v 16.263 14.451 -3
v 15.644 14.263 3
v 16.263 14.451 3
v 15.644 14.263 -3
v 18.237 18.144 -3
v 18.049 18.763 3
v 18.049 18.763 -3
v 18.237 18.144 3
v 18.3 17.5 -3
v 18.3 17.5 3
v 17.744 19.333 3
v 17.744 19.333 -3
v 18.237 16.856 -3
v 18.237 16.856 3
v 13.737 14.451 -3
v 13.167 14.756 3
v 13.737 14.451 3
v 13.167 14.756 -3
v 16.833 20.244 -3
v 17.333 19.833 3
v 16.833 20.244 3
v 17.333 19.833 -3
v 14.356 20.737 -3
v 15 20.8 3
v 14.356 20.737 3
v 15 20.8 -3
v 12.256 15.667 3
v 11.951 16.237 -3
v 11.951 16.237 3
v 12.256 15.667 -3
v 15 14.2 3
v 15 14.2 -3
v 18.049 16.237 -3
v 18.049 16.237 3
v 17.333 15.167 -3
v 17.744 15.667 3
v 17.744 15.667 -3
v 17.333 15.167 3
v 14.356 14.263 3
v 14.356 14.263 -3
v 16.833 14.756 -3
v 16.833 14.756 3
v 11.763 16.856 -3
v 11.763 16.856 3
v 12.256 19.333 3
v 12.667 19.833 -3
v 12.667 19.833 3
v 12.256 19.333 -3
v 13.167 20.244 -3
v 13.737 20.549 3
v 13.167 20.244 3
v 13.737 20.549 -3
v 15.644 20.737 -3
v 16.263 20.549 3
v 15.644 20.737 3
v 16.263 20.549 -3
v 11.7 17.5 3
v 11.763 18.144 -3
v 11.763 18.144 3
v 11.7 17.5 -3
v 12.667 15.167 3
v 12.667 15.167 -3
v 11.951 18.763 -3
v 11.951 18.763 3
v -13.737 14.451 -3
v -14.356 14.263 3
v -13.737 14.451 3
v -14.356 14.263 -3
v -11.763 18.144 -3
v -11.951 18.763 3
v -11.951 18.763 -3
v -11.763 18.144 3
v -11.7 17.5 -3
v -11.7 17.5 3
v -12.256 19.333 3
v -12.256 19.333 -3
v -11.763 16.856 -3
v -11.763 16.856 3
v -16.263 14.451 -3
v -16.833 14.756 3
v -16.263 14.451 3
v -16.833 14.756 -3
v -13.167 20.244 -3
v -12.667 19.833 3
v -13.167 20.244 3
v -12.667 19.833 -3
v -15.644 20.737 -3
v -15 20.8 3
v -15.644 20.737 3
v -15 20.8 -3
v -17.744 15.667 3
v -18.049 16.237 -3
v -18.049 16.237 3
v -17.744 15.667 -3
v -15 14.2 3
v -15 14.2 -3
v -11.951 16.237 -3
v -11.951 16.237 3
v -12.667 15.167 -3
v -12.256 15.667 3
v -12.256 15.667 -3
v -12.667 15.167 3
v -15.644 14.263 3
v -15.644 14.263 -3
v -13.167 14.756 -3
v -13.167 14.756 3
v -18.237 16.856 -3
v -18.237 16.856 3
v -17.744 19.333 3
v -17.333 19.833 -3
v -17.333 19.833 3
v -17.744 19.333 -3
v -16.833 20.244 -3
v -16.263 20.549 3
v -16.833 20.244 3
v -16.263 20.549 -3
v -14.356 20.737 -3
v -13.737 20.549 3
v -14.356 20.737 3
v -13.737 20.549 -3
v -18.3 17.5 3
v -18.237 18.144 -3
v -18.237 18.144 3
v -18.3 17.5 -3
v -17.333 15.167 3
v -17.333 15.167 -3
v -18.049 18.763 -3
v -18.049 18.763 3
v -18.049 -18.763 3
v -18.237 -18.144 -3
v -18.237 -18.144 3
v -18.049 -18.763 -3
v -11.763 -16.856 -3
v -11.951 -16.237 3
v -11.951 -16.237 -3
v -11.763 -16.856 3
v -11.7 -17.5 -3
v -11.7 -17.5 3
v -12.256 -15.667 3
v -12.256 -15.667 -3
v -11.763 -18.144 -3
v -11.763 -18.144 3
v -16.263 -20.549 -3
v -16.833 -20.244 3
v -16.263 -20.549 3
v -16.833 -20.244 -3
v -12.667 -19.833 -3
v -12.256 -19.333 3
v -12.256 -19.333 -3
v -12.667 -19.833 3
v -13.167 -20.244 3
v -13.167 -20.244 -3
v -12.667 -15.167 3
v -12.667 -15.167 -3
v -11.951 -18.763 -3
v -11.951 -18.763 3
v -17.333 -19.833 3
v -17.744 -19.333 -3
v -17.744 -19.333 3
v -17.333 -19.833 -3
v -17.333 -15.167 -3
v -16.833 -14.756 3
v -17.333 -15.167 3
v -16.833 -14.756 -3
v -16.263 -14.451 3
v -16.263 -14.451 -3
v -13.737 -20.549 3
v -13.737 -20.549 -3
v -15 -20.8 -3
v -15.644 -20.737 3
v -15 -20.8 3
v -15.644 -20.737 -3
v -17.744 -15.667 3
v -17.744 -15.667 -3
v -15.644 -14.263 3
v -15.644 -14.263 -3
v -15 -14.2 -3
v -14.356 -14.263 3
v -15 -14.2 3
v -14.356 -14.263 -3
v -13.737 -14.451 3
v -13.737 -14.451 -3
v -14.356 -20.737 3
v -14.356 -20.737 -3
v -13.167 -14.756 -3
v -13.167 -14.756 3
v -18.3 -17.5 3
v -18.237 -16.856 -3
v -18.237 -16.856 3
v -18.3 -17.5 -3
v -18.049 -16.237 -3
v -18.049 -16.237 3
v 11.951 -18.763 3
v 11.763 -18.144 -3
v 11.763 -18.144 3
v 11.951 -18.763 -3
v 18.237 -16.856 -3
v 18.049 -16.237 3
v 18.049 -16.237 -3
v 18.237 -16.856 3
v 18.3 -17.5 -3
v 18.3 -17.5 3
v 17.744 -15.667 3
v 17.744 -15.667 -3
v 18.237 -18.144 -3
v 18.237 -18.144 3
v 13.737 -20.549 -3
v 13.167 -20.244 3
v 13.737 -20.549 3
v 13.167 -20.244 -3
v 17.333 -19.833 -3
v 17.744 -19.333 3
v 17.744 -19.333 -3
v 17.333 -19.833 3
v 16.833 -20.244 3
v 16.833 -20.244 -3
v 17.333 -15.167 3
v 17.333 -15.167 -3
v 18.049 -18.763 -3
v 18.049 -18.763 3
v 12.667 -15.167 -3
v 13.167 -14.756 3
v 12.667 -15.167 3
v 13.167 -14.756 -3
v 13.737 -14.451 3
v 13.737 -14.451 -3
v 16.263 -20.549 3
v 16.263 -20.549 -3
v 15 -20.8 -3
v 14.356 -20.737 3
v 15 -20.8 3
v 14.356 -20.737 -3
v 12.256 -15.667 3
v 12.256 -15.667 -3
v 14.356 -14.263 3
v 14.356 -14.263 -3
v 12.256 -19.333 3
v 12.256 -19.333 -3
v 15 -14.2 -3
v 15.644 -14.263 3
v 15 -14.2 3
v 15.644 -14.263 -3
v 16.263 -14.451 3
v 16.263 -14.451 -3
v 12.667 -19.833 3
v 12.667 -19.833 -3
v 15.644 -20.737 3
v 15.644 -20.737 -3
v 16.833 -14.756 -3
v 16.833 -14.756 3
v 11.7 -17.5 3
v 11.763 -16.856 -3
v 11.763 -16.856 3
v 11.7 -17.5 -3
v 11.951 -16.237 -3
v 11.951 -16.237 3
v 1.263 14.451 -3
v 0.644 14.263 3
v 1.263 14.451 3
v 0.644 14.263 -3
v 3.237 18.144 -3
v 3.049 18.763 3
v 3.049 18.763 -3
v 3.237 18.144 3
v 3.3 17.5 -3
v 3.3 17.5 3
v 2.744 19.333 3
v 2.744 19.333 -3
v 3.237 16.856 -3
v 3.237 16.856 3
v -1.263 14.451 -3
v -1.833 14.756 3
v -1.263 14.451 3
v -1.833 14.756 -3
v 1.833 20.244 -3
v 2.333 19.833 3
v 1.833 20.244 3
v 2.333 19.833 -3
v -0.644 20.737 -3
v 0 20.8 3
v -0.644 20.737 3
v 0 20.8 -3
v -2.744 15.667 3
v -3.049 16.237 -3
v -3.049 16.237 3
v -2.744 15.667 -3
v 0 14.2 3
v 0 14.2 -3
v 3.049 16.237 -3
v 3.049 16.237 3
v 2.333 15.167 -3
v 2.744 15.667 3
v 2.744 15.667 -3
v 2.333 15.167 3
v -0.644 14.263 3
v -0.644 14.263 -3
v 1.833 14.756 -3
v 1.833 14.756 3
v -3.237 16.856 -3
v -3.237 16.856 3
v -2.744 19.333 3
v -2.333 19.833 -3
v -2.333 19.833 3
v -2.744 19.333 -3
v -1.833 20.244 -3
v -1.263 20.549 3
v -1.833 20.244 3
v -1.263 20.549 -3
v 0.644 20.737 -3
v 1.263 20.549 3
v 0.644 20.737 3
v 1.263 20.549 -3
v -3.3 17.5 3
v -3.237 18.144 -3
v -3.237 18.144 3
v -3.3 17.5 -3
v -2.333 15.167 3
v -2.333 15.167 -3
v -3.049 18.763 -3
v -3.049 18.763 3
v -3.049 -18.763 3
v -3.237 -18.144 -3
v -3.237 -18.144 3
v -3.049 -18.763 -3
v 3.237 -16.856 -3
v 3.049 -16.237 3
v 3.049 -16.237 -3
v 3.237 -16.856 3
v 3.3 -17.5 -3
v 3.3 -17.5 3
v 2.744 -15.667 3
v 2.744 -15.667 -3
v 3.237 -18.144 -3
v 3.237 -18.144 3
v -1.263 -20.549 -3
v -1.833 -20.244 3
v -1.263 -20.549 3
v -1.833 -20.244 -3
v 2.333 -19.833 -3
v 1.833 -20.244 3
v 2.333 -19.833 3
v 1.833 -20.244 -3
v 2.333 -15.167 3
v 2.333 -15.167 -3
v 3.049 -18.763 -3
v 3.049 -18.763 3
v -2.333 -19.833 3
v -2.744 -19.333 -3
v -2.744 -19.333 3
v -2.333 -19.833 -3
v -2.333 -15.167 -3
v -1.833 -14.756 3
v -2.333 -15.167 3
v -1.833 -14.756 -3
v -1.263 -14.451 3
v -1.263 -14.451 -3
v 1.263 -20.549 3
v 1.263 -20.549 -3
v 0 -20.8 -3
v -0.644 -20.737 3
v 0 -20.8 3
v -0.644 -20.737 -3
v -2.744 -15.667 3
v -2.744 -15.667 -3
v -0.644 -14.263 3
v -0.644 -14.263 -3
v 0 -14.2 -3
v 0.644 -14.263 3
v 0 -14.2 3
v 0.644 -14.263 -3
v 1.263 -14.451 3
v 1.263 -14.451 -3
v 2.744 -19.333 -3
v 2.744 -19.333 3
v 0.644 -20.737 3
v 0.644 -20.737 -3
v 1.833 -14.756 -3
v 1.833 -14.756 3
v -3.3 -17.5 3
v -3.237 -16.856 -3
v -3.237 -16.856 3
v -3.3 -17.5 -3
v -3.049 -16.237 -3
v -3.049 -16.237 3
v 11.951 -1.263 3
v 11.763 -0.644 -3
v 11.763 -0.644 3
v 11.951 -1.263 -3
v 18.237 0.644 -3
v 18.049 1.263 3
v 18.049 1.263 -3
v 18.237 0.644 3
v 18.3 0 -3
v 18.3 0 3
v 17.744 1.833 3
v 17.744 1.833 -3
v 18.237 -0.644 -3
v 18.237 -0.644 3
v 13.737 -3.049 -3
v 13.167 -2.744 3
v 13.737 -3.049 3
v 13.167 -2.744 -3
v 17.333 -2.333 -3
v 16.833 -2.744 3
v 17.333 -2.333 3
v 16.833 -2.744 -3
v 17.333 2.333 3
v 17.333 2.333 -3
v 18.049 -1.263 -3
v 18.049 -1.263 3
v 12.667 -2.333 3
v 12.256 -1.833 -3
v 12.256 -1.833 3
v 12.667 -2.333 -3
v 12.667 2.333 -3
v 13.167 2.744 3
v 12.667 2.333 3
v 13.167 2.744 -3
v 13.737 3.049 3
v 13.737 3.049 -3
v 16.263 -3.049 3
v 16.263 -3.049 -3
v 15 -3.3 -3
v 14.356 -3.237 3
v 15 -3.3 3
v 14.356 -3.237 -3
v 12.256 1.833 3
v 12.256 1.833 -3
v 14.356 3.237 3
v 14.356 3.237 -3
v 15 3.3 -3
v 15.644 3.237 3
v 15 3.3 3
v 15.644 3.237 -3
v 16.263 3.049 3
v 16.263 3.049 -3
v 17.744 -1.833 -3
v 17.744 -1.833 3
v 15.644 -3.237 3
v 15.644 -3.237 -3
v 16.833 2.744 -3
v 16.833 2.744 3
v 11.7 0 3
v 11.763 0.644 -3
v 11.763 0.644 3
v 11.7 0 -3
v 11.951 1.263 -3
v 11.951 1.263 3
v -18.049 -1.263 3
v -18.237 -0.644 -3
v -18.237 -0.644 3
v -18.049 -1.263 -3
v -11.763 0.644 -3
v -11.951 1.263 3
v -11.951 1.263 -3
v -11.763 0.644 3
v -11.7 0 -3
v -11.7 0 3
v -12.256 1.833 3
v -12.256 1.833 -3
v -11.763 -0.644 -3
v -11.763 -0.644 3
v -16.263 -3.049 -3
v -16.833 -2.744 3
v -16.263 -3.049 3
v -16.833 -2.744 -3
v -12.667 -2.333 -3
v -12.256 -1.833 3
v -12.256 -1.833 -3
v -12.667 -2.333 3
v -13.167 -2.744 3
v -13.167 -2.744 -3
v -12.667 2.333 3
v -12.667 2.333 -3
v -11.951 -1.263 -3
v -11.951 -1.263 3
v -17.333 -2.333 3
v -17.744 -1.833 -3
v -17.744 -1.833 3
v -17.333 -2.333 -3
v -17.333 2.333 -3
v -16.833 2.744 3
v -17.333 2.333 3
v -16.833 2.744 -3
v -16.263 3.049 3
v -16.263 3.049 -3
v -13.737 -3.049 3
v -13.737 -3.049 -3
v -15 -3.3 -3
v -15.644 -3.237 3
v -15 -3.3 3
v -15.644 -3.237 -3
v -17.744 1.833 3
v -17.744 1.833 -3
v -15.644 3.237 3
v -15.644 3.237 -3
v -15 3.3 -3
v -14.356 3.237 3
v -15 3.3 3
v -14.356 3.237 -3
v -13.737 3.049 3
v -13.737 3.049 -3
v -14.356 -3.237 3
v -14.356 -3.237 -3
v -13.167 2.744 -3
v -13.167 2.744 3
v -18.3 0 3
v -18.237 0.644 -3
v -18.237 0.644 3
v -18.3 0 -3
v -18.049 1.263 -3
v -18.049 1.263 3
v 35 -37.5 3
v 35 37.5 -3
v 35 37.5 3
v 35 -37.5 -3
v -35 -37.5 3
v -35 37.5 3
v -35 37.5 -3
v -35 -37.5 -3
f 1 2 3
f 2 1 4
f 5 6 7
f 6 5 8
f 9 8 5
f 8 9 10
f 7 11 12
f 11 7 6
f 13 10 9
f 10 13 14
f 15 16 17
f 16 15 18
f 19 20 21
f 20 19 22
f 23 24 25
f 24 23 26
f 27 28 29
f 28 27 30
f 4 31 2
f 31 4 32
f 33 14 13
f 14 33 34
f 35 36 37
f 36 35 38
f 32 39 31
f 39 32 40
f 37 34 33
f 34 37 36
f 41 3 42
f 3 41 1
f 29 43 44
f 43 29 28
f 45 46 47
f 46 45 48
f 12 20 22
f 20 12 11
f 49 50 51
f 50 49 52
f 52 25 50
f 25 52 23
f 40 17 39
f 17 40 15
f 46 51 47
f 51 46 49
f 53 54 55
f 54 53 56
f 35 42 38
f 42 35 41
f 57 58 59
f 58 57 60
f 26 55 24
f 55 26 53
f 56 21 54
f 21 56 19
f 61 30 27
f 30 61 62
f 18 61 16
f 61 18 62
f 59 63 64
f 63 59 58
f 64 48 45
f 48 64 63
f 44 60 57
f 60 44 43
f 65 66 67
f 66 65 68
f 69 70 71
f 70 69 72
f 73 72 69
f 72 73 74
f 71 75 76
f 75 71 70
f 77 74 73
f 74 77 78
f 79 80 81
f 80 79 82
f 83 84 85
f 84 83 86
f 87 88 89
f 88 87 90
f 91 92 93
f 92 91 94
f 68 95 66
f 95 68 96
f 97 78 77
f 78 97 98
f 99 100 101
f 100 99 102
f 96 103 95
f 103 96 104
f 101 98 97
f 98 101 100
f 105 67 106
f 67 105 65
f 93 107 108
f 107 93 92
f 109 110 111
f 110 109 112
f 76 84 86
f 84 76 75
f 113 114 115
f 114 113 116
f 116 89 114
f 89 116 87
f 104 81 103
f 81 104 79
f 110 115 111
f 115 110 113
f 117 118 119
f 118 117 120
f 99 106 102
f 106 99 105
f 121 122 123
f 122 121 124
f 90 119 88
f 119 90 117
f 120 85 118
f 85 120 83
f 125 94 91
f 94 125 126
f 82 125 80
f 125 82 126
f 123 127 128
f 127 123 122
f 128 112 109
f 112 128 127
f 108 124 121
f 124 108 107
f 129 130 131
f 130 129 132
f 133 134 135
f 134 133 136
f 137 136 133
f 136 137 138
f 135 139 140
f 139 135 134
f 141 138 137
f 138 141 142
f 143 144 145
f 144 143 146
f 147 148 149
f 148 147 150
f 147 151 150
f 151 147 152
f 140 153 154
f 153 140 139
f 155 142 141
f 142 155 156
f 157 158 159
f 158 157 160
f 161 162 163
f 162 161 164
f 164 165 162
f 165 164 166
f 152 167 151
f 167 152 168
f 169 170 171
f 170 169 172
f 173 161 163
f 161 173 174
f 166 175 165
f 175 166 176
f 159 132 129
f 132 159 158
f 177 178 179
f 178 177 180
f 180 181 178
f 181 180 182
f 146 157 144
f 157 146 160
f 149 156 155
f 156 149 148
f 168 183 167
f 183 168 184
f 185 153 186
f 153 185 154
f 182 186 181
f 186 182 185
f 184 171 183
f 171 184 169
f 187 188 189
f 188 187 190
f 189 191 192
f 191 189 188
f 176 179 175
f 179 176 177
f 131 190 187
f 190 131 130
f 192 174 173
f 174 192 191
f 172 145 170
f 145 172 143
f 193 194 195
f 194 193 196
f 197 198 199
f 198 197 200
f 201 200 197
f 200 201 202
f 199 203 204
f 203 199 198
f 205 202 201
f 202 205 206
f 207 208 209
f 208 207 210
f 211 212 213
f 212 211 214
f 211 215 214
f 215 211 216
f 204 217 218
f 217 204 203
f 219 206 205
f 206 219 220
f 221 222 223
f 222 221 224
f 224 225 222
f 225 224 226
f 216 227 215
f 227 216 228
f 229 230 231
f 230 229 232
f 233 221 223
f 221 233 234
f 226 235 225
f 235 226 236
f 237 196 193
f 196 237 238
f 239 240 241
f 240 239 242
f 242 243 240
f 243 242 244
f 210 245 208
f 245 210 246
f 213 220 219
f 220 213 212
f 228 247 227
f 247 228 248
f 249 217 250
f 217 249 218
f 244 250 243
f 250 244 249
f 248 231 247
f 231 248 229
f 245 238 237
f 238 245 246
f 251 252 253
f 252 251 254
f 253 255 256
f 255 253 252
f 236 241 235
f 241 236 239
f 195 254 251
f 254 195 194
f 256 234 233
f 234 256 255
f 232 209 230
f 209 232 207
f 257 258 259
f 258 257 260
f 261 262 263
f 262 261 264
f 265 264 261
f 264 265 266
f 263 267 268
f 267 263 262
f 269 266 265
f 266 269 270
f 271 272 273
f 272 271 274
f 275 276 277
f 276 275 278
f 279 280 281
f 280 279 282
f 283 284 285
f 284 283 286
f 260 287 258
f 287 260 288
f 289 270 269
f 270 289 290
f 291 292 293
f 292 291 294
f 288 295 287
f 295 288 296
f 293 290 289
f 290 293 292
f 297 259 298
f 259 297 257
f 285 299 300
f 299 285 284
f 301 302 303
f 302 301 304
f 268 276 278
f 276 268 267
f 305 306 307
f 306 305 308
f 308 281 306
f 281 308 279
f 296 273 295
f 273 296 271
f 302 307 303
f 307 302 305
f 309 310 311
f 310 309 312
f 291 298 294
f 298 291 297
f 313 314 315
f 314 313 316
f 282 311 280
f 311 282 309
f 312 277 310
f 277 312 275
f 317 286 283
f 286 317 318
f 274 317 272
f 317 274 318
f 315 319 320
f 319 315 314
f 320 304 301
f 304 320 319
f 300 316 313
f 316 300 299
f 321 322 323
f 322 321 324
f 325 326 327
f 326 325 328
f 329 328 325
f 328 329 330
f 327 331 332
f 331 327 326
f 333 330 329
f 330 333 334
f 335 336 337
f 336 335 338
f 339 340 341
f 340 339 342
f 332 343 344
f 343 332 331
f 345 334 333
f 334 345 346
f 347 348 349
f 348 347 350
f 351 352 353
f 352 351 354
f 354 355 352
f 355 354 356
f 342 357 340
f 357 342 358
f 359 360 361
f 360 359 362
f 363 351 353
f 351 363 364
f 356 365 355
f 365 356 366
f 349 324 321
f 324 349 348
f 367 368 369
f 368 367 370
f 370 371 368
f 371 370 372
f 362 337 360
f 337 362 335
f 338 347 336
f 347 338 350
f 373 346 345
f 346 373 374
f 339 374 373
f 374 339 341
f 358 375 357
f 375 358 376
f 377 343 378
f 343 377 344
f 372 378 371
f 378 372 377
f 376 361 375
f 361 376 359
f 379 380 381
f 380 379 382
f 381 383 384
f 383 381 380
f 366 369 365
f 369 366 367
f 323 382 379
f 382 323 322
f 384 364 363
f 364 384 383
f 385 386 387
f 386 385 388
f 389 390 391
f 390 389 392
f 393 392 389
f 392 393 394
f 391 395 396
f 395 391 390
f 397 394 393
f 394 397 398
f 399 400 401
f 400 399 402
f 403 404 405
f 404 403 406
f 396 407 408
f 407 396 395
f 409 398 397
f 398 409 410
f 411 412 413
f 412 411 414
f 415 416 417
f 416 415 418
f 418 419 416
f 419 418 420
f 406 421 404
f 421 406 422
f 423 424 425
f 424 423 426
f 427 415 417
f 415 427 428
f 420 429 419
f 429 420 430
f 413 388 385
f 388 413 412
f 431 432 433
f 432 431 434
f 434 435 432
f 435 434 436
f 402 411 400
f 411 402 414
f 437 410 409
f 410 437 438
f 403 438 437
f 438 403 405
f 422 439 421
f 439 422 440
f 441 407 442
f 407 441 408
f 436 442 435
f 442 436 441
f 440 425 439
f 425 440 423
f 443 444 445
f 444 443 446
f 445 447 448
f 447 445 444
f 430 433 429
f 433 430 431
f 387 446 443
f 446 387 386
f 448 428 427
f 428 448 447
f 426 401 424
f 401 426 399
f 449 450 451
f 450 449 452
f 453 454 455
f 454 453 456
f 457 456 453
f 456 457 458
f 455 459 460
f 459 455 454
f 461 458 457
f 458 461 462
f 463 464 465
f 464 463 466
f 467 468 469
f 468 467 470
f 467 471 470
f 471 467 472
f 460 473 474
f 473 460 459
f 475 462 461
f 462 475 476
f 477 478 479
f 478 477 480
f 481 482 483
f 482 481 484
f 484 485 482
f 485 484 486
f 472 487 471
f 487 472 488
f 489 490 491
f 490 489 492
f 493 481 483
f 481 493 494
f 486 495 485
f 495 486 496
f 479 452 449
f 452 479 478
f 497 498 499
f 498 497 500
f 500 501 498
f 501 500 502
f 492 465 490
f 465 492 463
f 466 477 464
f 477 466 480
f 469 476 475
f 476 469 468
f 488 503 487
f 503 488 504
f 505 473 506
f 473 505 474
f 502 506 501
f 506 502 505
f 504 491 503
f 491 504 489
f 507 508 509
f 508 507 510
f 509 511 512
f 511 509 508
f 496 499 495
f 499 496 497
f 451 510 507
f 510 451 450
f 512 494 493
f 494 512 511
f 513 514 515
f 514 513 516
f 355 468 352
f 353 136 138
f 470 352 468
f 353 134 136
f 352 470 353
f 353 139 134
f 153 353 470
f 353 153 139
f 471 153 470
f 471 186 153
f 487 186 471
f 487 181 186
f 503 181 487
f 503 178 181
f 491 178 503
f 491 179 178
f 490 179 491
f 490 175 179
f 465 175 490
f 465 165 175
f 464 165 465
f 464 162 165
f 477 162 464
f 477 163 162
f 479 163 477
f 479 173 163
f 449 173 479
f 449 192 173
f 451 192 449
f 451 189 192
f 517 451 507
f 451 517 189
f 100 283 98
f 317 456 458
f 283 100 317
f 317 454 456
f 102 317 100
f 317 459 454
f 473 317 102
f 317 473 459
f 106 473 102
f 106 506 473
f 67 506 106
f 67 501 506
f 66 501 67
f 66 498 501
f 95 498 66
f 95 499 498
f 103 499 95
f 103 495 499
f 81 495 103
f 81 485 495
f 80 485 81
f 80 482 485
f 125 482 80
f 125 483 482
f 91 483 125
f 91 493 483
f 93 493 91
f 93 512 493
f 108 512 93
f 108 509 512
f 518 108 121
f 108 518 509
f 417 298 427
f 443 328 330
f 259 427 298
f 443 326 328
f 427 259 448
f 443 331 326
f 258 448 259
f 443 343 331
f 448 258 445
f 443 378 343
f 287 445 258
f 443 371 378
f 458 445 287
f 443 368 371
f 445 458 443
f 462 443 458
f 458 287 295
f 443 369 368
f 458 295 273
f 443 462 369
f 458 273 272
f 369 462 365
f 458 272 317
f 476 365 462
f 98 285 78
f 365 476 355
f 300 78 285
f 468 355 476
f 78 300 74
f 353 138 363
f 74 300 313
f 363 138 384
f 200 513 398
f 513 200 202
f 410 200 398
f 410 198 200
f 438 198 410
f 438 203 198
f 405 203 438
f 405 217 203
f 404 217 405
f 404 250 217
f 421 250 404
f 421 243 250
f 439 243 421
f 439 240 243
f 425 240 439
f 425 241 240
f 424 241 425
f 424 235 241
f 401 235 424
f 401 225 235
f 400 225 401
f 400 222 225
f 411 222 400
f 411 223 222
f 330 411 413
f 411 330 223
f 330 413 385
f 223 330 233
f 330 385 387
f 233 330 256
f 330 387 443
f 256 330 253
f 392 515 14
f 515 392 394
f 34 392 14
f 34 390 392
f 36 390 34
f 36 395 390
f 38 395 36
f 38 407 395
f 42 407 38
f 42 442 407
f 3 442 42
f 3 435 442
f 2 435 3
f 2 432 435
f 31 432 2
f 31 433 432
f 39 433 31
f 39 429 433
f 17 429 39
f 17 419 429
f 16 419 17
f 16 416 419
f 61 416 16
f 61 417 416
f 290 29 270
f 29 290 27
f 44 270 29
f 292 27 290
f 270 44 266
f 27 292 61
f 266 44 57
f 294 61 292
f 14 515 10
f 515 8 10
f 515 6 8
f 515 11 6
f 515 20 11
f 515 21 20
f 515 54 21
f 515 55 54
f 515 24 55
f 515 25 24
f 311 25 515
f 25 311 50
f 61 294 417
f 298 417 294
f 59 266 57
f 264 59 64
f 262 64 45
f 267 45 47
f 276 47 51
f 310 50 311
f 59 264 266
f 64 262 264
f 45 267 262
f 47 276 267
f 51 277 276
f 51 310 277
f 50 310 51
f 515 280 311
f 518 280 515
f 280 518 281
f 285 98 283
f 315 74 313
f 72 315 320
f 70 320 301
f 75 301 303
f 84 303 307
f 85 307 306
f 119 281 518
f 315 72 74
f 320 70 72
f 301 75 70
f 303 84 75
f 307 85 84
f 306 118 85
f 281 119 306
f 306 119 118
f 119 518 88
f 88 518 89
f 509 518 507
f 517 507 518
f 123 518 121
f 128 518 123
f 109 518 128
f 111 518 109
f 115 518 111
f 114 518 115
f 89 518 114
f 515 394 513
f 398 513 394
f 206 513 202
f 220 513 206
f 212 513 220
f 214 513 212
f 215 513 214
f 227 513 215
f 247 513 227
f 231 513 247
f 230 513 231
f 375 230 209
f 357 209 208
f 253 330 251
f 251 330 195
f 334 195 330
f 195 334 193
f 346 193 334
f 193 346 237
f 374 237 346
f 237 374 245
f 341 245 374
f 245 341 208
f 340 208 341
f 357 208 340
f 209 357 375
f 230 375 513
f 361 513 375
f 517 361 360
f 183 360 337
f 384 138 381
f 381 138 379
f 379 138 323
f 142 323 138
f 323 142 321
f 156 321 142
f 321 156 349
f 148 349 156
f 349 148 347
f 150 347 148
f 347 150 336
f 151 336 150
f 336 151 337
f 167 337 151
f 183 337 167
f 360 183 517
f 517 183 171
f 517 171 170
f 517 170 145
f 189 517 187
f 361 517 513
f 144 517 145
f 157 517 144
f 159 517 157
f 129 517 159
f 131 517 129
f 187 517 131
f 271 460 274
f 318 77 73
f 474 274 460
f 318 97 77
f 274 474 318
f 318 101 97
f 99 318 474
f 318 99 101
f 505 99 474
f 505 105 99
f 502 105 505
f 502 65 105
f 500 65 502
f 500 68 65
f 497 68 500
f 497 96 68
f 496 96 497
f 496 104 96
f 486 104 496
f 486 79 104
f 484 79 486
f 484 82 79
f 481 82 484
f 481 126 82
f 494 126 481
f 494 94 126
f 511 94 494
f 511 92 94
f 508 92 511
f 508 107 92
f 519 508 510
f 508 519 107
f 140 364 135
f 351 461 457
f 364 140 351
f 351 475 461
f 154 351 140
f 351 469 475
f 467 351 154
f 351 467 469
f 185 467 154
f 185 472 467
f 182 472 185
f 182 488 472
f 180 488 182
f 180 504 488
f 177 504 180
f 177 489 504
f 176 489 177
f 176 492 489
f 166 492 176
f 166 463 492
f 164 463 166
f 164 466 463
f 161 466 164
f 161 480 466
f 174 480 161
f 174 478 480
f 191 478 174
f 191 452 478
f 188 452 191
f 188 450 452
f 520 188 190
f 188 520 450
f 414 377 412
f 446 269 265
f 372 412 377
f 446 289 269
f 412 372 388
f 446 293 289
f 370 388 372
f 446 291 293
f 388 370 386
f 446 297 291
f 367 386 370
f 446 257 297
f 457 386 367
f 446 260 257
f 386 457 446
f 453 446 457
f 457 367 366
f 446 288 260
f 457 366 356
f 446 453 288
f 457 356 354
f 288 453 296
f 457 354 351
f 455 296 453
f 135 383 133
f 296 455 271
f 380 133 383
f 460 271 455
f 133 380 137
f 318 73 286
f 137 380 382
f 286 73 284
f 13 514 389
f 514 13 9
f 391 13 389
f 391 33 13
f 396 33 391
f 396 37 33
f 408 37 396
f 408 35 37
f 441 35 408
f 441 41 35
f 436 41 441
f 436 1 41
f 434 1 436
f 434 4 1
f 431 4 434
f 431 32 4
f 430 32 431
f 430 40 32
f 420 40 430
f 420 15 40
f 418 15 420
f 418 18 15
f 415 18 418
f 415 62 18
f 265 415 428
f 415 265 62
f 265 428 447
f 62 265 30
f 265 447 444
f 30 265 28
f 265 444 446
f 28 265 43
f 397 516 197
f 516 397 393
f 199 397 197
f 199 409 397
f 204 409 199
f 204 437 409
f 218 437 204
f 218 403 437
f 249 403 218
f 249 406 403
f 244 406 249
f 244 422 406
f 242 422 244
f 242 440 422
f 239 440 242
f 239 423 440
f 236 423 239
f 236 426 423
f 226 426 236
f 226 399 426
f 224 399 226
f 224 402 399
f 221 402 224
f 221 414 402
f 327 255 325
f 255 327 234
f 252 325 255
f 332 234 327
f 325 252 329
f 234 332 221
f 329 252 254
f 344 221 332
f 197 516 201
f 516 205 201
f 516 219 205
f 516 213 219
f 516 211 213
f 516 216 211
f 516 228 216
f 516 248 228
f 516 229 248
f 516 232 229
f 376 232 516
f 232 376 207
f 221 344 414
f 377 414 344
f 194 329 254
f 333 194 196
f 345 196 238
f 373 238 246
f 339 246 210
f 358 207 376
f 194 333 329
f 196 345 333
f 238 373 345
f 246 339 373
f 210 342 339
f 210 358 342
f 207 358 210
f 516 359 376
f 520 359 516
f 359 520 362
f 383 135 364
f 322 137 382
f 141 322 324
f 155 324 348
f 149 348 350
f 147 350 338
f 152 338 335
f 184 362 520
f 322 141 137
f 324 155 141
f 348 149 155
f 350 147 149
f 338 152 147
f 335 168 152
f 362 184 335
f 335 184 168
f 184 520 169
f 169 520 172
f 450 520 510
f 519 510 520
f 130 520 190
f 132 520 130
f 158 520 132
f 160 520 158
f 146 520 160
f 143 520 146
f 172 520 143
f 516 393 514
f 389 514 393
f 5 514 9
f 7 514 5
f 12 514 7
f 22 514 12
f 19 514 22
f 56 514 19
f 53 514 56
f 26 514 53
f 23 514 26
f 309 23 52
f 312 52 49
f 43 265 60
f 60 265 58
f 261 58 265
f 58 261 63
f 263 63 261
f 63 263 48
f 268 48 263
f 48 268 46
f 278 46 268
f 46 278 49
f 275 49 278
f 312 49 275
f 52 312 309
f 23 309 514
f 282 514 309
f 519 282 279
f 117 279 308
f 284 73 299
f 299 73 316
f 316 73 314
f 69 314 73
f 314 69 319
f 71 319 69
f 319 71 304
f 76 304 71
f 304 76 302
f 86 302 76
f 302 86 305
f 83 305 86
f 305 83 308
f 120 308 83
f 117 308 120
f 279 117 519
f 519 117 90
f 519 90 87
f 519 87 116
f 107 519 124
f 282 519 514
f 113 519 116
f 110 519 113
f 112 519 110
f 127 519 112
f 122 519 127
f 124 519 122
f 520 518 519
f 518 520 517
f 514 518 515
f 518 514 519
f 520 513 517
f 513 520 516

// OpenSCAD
$fn = 32;

// ----------------------------------------------------------------------
// Corner plate 70 x 75 x 6
// 8 holes, centres taken from the edge offset
// ----------------------------------------------------------------------

// --- parameters (mm) ---
plate = [70, 75, 6];  // overall size (x, y, z)
holes = 8;            // number of holes the drawing asks for
hole_d = 6.6;         // hole diameter
edge = 20;            // hole centre offset from the plate edge

// --- derived feature positions (mm) ---
corner_x = plate[0] / 2 - edge;  // = 15   corner hole X
corner_y = plate[1] / 2 - edge;  // = 17.5   corner hole Y
feature_centers = [
  [corner_x, corner_y],
  [-corner_x, corner_y],
  [-corner_x, -corner_y],
  [corner_x, -corner_y],
  [0, corner_y],
  [0, -corner_y],
  [corner_x, 0],
  [-corner_x, 0]
];   // hole centres the loop below drills

// plate outline, every hole drilled through with the same cutters
difference() {
  cube(plate, center = true);
  for (centre = feature_centers)
    translate([centre[0], centre[1], 0])
      cylinder(d = hole_d, h = plate[2] + 2, center = true);
}
